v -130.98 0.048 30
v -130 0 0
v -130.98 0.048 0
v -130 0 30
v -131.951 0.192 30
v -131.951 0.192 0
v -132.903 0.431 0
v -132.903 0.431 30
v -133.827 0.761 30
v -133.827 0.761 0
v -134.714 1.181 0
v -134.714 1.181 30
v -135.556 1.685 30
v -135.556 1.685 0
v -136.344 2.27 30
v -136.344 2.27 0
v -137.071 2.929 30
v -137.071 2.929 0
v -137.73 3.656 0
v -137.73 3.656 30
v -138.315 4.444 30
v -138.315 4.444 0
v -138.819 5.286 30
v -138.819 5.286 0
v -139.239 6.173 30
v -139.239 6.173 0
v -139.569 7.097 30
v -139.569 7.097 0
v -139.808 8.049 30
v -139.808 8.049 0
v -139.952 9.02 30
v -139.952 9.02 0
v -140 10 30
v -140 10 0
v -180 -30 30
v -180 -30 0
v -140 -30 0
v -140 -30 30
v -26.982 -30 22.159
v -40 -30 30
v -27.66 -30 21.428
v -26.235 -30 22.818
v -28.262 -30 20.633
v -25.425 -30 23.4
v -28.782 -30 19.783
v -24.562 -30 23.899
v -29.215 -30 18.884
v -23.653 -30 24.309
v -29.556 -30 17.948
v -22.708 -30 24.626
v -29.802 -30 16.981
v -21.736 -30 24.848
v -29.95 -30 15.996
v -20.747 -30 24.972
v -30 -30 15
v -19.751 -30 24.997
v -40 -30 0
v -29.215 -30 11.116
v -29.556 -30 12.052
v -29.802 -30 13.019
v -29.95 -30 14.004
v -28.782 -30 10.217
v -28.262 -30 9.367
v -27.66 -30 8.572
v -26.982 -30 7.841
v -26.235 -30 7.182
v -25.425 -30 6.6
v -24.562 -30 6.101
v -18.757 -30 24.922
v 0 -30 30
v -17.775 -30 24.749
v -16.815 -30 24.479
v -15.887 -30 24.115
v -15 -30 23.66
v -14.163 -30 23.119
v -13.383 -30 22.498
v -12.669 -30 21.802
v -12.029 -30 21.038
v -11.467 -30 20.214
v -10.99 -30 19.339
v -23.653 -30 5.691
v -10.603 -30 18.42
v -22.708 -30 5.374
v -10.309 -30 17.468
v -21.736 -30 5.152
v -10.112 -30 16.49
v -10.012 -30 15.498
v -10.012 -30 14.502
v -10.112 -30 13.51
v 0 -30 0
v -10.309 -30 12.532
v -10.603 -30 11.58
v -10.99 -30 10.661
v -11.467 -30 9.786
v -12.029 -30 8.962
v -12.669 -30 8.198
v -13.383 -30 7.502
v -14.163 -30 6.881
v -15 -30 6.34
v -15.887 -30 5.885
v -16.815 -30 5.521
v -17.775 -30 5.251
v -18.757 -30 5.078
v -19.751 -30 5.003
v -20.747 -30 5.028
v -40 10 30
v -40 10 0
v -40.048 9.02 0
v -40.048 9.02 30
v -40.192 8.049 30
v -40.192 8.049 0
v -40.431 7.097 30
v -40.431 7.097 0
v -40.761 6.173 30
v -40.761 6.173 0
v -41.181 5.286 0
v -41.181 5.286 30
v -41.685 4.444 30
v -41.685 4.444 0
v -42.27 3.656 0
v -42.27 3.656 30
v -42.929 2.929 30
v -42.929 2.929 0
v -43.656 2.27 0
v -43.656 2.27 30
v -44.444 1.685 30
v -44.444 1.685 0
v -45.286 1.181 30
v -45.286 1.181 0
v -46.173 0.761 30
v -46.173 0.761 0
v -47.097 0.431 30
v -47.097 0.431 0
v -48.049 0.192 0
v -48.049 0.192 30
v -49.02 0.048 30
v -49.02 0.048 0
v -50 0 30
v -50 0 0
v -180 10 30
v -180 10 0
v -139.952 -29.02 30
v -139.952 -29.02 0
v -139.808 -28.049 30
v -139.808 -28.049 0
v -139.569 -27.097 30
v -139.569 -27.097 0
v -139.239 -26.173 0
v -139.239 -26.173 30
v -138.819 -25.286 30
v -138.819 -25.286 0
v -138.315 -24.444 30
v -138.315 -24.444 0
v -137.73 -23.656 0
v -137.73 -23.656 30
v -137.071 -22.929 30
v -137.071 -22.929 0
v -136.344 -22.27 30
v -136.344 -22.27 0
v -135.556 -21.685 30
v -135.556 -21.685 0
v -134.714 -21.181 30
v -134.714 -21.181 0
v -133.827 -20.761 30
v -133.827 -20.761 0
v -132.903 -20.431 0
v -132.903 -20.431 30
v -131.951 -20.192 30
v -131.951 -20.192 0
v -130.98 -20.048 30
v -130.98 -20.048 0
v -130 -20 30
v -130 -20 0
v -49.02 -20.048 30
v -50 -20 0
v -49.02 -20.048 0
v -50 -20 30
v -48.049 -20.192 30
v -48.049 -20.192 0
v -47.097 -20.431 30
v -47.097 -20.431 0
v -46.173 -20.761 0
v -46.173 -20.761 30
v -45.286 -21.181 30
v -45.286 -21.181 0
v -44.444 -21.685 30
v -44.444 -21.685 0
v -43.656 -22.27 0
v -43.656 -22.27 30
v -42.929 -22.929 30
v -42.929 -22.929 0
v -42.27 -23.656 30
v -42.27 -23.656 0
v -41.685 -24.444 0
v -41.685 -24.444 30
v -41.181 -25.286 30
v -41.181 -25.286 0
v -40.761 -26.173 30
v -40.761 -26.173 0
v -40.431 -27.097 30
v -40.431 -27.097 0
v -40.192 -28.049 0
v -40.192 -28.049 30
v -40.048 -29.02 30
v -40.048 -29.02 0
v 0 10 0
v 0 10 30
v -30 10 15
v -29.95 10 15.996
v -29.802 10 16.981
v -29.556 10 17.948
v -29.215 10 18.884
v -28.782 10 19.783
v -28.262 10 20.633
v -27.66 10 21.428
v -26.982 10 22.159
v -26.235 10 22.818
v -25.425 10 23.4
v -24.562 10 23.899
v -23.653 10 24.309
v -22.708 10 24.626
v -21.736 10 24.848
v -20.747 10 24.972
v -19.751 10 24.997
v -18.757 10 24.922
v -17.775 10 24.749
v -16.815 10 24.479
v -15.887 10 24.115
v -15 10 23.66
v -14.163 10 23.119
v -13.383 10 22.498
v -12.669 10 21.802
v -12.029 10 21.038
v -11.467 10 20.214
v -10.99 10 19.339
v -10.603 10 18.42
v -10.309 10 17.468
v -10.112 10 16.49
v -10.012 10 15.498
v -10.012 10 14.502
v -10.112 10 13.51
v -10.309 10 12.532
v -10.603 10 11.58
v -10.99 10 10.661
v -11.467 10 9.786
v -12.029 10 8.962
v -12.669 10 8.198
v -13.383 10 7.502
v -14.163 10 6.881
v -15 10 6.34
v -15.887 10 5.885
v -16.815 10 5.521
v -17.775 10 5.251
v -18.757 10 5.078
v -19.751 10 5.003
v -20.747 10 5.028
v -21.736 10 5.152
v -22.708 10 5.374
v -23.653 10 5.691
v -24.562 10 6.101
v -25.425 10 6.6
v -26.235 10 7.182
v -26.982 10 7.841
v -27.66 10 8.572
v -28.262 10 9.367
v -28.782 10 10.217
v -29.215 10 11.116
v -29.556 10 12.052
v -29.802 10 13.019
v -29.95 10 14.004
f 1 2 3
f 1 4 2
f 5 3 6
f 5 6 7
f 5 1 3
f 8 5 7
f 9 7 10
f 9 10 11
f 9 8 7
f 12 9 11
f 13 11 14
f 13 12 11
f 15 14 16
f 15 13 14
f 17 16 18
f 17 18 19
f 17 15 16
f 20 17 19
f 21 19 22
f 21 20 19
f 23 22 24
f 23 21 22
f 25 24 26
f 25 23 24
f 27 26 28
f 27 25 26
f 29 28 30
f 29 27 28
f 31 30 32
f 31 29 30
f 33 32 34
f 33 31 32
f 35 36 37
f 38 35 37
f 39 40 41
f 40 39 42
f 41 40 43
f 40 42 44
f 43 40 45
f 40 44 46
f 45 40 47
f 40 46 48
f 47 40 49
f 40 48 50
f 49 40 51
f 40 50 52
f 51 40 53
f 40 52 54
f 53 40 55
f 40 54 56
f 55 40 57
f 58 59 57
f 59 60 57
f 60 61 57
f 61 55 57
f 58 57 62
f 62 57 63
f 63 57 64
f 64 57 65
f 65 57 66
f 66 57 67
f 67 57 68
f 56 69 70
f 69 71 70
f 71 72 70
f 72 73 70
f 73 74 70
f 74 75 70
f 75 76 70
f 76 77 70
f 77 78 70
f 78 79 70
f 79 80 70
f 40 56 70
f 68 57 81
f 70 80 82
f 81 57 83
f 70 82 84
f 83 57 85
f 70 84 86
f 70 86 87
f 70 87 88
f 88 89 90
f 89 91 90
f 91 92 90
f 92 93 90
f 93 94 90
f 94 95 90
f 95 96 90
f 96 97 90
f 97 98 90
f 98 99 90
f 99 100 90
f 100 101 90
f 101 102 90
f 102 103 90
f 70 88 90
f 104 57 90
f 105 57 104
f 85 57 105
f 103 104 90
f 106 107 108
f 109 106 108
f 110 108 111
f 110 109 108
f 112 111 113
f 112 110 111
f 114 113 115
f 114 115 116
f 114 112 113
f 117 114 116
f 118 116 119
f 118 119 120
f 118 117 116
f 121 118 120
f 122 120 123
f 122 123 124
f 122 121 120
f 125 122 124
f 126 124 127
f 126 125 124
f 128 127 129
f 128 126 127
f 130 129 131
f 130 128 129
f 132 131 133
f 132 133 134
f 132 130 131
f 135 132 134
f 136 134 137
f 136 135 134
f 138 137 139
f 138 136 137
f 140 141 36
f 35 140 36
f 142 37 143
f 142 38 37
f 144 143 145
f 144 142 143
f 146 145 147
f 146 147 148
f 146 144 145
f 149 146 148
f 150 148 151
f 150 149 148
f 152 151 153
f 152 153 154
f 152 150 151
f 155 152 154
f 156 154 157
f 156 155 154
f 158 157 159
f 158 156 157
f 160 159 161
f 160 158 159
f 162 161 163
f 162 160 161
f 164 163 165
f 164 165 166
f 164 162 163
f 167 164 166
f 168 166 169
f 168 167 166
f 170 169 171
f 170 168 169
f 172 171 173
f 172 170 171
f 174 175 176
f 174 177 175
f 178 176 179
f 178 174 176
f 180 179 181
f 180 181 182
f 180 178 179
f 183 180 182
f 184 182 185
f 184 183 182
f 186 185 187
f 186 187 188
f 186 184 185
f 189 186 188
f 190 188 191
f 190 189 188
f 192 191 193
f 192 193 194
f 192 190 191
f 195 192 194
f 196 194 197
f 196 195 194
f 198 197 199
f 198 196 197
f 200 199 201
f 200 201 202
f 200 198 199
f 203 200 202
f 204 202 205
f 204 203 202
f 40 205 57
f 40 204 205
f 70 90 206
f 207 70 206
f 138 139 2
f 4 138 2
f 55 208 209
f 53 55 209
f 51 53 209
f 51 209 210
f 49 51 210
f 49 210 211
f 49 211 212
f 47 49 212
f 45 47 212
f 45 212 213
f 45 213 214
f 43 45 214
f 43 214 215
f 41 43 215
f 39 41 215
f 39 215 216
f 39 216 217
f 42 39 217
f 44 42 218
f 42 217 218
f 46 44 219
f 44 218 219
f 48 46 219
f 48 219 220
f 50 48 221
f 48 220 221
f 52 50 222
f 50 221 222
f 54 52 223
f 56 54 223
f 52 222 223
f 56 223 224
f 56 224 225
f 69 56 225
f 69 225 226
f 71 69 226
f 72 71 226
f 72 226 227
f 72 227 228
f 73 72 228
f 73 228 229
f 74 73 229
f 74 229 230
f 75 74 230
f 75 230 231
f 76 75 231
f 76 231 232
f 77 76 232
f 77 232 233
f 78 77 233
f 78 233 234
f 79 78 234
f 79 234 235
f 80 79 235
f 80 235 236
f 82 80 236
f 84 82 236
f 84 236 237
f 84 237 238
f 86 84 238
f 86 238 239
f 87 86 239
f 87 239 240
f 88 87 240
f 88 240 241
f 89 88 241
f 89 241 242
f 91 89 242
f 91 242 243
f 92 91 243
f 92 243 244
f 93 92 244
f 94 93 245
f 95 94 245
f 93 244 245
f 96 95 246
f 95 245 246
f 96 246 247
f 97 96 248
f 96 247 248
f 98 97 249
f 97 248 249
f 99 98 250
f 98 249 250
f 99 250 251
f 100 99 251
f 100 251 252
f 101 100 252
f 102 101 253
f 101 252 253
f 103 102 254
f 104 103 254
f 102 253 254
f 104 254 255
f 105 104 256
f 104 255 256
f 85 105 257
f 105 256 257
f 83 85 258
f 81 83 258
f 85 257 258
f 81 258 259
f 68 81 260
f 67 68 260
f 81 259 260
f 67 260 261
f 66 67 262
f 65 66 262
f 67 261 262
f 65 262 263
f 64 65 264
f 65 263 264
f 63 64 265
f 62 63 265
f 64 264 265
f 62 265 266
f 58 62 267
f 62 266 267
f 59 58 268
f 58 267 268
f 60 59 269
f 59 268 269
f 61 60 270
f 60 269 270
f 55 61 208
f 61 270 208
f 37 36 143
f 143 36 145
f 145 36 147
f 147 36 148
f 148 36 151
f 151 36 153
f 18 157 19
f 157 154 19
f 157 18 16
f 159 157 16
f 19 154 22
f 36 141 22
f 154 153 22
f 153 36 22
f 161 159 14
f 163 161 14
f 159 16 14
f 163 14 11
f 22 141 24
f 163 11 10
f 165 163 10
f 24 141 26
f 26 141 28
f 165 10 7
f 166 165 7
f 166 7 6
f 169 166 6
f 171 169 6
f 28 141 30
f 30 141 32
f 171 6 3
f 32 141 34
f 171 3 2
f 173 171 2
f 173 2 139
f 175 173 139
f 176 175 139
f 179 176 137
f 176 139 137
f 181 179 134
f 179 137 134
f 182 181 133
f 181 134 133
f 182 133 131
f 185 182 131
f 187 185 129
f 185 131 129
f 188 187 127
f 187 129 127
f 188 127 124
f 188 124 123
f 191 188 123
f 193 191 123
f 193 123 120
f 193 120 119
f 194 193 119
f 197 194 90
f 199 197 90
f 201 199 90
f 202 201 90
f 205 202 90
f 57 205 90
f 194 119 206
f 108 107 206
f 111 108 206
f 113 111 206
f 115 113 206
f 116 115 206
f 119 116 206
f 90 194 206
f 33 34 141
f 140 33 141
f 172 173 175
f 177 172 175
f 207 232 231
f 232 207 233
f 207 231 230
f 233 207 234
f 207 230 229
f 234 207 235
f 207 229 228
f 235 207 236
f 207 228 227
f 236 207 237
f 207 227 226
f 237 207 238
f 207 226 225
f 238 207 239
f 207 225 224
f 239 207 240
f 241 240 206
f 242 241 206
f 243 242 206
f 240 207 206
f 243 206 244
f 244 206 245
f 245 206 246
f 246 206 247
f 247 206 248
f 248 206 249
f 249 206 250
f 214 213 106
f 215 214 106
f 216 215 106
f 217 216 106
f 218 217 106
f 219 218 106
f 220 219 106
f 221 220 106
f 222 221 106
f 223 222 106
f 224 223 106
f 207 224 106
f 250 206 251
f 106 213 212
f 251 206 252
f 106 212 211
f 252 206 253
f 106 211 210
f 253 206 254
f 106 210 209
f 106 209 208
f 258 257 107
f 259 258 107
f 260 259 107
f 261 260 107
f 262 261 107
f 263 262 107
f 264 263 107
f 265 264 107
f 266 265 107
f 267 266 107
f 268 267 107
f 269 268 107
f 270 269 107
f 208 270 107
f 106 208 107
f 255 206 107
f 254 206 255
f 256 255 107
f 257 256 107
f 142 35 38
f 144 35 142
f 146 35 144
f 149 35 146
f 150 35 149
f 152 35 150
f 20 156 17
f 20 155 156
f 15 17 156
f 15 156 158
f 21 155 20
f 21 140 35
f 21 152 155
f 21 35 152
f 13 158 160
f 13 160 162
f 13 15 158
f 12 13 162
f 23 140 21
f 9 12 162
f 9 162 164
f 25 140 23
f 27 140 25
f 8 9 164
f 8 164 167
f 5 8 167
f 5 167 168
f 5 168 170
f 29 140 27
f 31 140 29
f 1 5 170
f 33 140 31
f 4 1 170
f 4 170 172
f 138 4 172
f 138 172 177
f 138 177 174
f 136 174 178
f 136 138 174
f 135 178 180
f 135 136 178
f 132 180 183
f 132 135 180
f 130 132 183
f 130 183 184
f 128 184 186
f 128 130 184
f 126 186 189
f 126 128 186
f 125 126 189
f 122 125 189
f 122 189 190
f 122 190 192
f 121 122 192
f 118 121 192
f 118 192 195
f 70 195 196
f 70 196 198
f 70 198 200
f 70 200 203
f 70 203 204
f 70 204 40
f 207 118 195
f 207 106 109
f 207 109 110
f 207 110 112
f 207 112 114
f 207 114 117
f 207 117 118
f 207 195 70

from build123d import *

# Parameters (mm, degrees)
BOSS_EXTRUDE2_DEPTH = 30
FILLET1_R           = 10
SKETCH3_R           = 10
CUT_EXTRUDE1_DEPTH  = 187.815416923


with BuildPart() as part:
    # Sketch2 → Boss-Extrude2 (new body)
    with BuildSketch(Plane.XY):
        Polygon((0, 0), (0, 10), (-40, 10), (-40, 0), (-140, 0), (-140, 10), (-180, 10), (-180, -30), (-140, -30), (-140, -20), (-40, -20), (-40, -30), (0, -30), align=None)
    extrude(amount=BOSS_EXTRUDE2_DEPTH)

    # Fillet1
    fillet1_edges = [part.edges().sort_by_distance(p)[0] for p in [
        (-40, -20, 15),
        (-140, -20, 15),
        (-40, 0, 15),
        (-140, 0, 15),
    ]]
    fillet(fillet1_edges, radius=FILLET1_R - 0.0001)  # a hair under: the kernel refuses the full size

    # Sketch3 → Cut-Extrude1 (cut, through all)
    with BuildSketch(Plane(origin=(0, 10, 0), x_dir=(1, 0, 0), z_dir=(0, 1, 0))):
        with Locations(Location((-20, -15, 0), (0, 0, 180))):
            Circle(SKETCH3_R)
        with Locations((-200, -15)):
            Circle(SKETCH3_R)
    extrude(amount=-CUT_EXTRUDE1_DEPTH, mode=Mode.SUBTRACT)


solid = part.part
